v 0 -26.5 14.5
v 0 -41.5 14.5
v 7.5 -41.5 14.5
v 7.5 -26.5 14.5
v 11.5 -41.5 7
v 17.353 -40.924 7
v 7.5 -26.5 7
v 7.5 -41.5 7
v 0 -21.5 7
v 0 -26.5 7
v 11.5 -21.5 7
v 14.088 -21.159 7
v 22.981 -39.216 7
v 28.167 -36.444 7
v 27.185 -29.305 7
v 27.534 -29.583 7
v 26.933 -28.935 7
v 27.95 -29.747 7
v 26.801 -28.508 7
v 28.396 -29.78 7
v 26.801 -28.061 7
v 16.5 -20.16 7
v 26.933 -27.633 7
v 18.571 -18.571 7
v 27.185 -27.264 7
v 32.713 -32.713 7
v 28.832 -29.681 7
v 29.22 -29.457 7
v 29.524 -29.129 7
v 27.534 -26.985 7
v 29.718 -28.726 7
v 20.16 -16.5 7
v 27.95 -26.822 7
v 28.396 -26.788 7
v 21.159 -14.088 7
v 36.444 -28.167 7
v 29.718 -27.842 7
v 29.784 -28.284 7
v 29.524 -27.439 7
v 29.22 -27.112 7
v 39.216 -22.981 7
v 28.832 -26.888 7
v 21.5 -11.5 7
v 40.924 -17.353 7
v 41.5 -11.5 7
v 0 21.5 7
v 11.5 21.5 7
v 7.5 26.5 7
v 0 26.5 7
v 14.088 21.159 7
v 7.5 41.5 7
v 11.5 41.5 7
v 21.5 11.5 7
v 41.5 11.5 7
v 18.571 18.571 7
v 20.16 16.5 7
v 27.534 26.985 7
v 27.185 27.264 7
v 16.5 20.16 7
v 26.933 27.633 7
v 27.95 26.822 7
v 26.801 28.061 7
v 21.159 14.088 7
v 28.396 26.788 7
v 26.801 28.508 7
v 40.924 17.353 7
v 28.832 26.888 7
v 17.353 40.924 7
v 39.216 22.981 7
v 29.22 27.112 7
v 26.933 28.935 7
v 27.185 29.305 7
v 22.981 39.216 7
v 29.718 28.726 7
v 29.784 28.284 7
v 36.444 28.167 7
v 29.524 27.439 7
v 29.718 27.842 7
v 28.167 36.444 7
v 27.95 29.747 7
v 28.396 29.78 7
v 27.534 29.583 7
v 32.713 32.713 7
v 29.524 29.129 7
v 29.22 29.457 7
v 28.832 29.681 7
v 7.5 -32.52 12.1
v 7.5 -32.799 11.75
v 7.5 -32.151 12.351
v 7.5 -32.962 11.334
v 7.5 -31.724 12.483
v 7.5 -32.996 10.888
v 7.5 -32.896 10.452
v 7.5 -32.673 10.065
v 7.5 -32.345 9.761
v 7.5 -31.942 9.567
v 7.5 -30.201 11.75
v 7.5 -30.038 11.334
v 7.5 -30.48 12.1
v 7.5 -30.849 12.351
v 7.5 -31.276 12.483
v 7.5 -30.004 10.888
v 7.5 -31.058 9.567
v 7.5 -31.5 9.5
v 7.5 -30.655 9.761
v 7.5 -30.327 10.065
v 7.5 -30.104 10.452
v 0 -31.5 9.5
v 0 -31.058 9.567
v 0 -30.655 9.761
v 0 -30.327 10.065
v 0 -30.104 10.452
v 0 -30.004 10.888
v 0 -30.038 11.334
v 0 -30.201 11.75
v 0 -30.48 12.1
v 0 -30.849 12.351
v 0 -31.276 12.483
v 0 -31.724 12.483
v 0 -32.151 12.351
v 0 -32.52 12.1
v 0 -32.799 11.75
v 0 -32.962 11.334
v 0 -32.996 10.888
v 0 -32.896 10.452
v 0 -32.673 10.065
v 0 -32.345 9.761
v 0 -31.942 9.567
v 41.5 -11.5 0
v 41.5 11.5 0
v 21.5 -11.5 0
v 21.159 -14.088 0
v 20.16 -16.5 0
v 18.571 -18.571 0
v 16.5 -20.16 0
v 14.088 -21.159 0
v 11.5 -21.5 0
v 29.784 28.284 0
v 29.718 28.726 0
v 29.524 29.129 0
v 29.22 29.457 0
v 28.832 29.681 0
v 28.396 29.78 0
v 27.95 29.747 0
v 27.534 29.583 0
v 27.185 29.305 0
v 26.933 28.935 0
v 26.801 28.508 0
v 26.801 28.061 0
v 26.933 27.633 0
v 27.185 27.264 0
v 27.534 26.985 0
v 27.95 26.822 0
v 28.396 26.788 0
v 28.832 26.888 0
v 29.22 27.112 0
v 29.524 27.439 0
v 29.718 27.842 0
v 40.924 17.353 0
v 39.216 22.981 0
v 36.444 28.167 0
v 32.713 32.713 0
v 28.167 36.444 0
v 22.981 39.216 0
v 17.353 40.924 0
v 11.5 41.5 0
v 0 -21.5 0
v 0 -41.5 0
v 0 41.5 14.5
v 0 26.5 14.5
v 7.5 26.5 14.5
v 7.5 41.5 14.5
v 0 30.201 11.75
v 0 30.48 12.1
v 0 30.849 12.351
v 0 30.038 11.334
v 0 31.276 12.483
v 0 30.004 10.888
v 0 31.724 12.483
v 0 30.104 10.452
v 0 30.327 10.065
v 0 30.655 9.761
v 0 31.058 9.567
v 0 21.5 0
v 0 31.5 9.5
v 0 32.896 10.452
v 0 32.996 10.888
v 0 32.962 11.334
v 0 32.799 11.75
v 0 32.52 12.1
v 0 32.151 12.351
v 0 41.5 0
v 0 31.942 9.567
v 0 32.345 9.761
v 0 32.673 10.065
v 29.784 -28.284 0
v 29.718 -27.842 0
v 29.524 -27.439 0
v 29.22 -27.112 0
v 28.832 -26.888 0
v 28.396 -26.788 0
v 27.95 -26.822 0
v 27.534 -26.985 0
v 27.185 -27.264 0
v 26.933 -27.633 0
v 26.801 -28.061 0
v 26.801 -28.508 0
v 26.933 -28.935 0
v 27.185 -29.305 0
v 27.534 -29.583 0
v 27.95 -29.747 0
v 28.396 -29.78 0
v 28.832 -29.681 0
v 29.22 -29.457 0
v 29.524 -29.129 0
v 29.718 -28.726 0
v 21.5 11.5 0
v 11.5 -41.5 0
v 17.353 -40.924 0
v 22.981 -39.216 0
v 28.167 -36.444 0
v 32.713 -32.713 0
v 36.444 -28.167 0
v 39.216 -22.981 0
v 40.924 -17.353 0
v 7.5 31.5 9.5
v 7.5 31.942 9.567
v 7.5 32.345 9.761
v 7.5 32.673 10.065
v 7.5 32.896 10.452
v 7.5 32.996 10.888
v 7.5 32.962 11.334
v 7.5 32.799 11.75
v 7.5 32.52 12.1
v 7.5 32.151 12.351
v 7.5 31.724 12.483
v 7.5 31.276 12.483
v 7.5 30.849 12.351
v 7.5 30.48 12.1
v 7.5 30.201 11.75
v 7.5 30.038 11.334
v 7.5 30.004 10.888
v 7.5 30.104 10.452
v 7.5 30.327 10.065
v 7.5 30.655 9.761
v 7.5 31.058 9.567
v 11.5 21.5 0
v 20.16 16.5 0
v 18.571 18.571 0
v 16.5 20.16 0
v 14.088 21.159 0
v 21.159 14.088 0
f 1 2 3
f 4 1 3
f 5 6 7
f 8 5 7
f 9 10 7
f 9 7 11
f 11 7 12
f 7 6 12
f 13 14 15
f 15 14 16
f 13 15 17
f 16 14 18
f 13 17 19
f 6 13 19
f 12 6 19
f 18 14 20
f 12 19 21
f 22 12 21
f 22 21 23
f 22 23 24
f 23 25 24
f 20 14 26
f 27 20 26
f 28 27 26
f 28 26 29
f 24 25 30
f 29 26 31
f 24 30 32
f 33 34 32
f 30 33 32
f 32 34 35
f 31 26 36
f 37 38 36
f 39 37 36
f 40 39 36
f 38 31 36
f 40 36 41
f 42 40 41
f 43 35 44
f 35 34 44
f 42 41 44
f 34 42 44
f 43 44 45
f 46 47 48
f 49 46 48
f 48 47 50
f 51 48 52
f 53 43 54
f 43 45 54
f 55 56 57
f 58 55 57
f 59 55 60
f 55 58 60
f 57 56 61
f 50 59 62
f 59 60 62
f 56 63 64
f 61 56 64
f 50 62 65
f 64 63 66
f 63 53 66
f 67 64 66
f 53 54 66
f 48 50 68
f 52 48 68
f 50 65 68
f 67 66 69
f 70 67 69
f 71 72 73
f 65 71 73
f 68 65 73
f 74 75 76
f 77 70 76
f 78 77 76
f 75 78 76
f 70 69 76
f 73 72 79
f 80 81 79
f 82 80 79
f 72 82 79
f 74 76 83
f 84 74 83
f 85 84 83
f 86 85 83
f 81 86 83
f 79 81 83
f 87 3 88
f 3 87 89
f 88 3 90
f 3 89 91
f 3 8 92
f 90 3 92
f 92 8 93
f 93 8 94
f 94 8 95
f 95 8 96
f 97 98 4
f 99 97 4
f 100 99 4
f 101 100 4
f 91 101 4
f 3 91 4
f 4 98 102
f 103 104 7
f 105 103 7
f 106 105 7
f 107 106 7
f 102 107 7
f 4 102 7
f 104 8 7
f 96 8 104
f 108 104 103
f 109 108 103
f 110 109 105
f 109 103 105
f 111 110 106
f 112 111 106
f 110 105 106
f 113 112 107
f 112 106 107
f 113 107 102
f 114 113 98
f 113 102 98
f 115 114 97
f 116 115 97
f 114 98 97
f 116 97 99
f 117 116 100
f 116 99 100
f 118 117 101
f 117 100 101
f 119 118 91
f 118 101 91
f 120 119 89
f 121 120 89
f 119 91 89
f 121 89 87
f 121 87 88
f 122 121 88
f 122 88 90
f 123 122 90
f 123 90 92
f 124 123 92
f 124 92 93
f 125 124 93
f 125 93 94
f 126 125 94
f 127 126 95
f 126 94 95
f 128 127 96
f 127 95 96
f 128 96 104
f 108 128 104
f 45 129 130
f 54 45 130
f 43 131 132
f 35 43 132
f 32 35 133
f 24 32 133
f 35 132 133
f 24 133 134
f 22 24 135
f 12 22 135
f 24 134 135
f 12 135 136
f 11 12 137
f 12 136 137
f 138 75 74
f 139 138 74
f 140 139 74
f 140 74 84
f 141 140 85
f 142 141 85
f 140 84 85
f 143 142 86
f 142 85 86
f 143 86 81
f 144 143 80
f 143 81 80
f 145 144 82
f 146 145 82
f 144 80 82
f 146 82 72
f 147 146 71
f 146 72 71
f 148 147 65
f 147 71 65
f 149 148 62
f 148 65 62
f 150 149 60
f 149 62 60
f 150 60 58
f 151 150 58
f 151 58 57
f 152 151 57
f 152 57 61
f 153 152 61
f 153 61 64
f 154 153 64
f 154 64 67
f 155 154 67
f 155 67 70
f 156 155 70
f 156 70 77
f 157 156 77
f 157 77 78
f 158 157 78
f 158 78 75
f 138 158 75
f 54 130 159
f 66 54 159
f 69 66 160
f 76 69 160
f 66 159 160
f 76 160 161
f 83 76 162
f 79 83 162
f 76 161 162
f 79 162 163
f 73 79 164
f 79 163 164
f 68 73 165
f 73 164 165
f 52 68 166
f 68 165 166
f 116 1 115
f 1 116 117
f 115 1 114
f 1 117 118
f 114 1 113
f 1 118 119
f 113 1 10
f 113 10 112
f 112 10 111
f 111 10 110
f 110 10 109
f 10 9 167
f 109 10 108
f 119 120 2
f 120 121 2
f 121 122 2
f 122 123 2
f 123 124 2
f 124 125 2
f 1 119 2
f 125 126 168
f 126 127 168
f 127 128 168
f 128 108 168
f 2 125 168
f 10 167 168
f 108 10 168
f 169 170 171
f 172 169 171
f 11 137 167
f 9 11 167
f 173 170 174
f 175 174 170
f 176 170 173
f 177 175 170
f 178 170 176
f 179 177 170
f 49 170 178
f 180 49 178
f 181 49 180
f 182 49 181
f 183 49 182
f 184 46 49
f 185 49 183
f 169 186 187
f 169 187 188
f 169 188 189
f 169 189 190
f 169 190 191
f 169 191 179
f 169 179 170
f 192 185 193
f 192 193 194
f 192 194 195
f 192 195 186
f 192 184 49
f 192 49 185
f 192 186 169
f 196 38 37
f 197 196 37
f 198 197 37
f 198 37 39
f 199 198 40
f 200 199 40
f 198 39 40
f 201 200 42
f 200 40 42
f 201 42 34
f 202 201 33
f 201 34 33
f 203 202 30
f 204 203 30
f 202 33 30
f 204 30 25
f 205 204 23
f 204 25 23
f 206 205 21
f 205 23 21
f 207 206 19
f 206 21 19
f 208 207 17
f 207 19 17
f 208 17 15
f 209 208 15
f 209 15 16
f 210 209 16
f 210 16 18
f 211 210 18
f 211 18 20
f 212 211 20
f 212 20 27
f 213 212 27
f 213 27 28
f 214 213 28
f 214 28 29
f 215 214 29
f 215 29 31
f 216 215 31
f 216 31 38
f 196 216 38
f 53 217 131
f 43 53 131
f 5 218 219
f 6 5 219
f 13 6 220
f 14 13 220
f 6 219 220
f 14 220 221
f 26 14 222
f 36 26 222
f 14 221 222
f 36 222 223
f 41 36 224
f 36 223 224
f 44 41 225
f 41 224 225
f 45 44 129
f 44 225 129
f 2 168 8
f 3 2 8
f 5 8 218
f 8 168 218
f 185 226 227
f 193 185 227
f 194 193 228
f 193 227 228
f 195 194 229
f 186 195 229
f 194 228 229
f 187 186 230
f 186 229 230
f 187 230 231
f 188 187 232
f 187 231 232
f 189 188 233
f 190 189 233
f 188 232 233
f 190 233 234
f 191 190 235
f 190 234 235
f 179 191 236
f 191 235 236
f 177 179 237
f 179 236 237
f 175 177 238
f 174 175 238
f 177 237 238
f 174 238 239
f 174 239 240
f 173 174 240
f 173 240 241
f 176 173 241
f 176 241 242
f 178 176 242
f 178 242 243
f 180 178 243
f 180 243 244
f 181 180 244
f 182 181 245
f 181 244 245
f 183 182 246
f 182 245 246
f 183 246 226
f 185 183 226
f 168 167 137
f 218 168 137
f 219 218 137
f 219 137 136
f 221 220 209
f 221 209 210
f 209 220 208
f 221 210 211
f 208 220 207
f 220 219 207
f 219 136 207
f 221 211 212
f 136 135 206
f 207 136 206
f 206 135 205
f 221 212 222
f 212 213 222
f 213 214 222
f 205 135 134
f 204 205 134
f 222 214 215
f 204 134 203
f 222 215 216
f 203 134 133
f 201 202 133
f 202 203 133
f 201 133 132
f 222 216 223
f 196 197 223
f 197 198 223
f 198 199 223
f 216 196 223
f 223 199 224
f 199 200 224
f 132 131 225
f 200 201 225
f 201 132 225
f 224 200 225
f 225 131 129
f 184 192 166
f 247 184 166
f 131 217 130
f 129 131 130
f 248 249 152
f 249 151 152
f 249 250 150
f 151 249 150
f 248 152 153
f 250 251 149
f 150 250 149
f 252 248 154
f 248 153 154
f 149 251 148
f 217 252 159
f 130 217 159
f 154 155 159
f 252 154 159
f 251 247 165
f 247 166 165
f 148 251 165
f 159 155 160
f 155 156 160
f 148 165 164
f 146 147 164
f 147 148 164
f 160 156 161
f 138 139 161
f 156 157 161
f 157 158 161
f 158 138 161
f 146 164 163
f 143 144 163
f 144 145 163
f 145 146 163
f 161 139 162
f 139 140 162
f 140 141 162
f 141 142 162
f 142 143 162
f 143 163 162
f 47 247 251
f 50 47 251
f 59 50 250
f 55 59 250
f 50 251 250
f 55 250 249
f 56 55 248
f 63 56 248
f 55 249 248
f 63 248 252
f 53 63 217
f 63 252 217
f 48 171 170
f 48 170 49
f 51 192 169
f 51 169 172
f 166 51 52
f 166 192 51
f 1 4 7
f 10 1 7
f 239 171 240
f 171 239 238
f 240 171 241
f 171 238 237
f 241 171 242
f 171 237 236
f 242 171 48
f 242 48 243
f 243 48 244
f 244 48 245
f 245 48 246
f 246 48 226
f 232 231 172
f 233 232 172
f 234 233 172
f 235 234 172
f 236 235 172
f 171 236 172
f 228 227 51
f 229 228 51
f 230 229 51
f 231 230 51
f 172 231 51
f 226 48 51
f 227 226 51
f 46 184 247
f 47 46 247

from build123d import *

# Parameters (mm, degrees)
BOSS_EXTRUDE4_DEPTH = 7
SKETCH6_W           = 7.5
SKETCH6_H           = 20
BOSS_EXTRUDE5_DEPTH = 7.5
SKETCH7_R           = 1.5
CUT_EXTRUDE3_DEPTH  = 7.5
SKETCH8_R           = 1.5
CUT_EXTRUDE4_DEPTH  = 7.5
SKETCH9_W           = 7.5
SKETCH9_H           = 5
CUT_EXTRUDE5_DEPTH  = 7.5


with BuildPart() as part:
    # Sketch1 → Boss-Extrude4 (new body)
    with BuildSketch(Plane.XY):
        with BuildLine():
            Line((41.5, -11.5), (41.5, 11.5))
            ThreePointArc((41.5, 11.5), (32.713203436, 32.713203436), (11.5, 41.5))
            Line((11.5, 41.5), (0, 41.5))
            Line((0, 41.5), (0, 21.5))
            Line((0, 21.5), (11.5, 21.5))
            ThreePointArc((11.5, 21.5), (18.571067812, 18.571067812), (21.5, 11.5))
            Line((21.5, 11.5), (21.5, -11.5))
            ThreePointArc((21.5, -11.5), (18.571067812, -18.571067812), (11.5, -21.5))
            Line((11.5, -21.5), (0, -21.5))
            Line((0, -21.5), (0, -41.5))
            Line((0, -41.5), (11.5, -41.5))
            ThreePointArc((11.5, -41.5), (32.713203436, -32.713203436), (41.5, -11.5))
        make_face()
    extrude(amount=BOSS_EXTRUDE4_DEPTH)

    # Sketch6 → Boss-Extrude5 (add)
    with BuildSketch(Plane.XY.offset(7)):
        with Locations((3.75, 31.5)):
            Rectangle(SKETCH6_W, SKETCH6_H)
        with Locations((3.75, -31.5)):
            Rectangle(SKETCH6_W, SKETCH6_H)
    extrude(amount=BOSS_EXTRUDE5_DEPTH)

    # Sketch7 → Cut-Extrude3 (cut)
    with BuildSketch(Plane(origin=(7.5, 0, 0), x_dir=(0, 0, -1), z_dir=(1, 0, 0))):
        with Locations((-11, 31.5)):
            Circle(SKETCH7_R)
        with Locations((-11, -31.5)):
            Circle(SKETCH7_R)
    extrude(amount=-CUT_EXTRUDE3_DEPTH, mode=Mode.SUBTRACT)

    # Sketch8 → Cut-Extrude4 (cut)
    with BuildSketch(Plane.XY.offset(7)):
        with Locations((28.284271247, 28.284271247)):
            Circle(SKETCH8_R)
        with Locations((28.284271247, -28.284271247)):
            Circle(SKETCH8_R)
    extrude(amount=-CUT_EXTRUDE4_DEPTH, mode=Mode.SUBTRACT)

    # Sketch9 → Cut-Extrude5 (cut)
    with BuildSketch(Plane(origin=(7.5, 0, 0), x_dir=(0, 0, -1), z_dir=(1, 0, 0))):
        with Locations((-10.75, 24)):
            Rectangle(SKETCH9_W, SKETCH9_H)
        with Locations((-10.75, -24)):
            Rectangle(SKETCH9_W, SKETCH9_H)
    extrude(amount=-CUT_EXTRUDE5_DEPTH, mode=Mode.SUBTRACT)


solid = part.part
